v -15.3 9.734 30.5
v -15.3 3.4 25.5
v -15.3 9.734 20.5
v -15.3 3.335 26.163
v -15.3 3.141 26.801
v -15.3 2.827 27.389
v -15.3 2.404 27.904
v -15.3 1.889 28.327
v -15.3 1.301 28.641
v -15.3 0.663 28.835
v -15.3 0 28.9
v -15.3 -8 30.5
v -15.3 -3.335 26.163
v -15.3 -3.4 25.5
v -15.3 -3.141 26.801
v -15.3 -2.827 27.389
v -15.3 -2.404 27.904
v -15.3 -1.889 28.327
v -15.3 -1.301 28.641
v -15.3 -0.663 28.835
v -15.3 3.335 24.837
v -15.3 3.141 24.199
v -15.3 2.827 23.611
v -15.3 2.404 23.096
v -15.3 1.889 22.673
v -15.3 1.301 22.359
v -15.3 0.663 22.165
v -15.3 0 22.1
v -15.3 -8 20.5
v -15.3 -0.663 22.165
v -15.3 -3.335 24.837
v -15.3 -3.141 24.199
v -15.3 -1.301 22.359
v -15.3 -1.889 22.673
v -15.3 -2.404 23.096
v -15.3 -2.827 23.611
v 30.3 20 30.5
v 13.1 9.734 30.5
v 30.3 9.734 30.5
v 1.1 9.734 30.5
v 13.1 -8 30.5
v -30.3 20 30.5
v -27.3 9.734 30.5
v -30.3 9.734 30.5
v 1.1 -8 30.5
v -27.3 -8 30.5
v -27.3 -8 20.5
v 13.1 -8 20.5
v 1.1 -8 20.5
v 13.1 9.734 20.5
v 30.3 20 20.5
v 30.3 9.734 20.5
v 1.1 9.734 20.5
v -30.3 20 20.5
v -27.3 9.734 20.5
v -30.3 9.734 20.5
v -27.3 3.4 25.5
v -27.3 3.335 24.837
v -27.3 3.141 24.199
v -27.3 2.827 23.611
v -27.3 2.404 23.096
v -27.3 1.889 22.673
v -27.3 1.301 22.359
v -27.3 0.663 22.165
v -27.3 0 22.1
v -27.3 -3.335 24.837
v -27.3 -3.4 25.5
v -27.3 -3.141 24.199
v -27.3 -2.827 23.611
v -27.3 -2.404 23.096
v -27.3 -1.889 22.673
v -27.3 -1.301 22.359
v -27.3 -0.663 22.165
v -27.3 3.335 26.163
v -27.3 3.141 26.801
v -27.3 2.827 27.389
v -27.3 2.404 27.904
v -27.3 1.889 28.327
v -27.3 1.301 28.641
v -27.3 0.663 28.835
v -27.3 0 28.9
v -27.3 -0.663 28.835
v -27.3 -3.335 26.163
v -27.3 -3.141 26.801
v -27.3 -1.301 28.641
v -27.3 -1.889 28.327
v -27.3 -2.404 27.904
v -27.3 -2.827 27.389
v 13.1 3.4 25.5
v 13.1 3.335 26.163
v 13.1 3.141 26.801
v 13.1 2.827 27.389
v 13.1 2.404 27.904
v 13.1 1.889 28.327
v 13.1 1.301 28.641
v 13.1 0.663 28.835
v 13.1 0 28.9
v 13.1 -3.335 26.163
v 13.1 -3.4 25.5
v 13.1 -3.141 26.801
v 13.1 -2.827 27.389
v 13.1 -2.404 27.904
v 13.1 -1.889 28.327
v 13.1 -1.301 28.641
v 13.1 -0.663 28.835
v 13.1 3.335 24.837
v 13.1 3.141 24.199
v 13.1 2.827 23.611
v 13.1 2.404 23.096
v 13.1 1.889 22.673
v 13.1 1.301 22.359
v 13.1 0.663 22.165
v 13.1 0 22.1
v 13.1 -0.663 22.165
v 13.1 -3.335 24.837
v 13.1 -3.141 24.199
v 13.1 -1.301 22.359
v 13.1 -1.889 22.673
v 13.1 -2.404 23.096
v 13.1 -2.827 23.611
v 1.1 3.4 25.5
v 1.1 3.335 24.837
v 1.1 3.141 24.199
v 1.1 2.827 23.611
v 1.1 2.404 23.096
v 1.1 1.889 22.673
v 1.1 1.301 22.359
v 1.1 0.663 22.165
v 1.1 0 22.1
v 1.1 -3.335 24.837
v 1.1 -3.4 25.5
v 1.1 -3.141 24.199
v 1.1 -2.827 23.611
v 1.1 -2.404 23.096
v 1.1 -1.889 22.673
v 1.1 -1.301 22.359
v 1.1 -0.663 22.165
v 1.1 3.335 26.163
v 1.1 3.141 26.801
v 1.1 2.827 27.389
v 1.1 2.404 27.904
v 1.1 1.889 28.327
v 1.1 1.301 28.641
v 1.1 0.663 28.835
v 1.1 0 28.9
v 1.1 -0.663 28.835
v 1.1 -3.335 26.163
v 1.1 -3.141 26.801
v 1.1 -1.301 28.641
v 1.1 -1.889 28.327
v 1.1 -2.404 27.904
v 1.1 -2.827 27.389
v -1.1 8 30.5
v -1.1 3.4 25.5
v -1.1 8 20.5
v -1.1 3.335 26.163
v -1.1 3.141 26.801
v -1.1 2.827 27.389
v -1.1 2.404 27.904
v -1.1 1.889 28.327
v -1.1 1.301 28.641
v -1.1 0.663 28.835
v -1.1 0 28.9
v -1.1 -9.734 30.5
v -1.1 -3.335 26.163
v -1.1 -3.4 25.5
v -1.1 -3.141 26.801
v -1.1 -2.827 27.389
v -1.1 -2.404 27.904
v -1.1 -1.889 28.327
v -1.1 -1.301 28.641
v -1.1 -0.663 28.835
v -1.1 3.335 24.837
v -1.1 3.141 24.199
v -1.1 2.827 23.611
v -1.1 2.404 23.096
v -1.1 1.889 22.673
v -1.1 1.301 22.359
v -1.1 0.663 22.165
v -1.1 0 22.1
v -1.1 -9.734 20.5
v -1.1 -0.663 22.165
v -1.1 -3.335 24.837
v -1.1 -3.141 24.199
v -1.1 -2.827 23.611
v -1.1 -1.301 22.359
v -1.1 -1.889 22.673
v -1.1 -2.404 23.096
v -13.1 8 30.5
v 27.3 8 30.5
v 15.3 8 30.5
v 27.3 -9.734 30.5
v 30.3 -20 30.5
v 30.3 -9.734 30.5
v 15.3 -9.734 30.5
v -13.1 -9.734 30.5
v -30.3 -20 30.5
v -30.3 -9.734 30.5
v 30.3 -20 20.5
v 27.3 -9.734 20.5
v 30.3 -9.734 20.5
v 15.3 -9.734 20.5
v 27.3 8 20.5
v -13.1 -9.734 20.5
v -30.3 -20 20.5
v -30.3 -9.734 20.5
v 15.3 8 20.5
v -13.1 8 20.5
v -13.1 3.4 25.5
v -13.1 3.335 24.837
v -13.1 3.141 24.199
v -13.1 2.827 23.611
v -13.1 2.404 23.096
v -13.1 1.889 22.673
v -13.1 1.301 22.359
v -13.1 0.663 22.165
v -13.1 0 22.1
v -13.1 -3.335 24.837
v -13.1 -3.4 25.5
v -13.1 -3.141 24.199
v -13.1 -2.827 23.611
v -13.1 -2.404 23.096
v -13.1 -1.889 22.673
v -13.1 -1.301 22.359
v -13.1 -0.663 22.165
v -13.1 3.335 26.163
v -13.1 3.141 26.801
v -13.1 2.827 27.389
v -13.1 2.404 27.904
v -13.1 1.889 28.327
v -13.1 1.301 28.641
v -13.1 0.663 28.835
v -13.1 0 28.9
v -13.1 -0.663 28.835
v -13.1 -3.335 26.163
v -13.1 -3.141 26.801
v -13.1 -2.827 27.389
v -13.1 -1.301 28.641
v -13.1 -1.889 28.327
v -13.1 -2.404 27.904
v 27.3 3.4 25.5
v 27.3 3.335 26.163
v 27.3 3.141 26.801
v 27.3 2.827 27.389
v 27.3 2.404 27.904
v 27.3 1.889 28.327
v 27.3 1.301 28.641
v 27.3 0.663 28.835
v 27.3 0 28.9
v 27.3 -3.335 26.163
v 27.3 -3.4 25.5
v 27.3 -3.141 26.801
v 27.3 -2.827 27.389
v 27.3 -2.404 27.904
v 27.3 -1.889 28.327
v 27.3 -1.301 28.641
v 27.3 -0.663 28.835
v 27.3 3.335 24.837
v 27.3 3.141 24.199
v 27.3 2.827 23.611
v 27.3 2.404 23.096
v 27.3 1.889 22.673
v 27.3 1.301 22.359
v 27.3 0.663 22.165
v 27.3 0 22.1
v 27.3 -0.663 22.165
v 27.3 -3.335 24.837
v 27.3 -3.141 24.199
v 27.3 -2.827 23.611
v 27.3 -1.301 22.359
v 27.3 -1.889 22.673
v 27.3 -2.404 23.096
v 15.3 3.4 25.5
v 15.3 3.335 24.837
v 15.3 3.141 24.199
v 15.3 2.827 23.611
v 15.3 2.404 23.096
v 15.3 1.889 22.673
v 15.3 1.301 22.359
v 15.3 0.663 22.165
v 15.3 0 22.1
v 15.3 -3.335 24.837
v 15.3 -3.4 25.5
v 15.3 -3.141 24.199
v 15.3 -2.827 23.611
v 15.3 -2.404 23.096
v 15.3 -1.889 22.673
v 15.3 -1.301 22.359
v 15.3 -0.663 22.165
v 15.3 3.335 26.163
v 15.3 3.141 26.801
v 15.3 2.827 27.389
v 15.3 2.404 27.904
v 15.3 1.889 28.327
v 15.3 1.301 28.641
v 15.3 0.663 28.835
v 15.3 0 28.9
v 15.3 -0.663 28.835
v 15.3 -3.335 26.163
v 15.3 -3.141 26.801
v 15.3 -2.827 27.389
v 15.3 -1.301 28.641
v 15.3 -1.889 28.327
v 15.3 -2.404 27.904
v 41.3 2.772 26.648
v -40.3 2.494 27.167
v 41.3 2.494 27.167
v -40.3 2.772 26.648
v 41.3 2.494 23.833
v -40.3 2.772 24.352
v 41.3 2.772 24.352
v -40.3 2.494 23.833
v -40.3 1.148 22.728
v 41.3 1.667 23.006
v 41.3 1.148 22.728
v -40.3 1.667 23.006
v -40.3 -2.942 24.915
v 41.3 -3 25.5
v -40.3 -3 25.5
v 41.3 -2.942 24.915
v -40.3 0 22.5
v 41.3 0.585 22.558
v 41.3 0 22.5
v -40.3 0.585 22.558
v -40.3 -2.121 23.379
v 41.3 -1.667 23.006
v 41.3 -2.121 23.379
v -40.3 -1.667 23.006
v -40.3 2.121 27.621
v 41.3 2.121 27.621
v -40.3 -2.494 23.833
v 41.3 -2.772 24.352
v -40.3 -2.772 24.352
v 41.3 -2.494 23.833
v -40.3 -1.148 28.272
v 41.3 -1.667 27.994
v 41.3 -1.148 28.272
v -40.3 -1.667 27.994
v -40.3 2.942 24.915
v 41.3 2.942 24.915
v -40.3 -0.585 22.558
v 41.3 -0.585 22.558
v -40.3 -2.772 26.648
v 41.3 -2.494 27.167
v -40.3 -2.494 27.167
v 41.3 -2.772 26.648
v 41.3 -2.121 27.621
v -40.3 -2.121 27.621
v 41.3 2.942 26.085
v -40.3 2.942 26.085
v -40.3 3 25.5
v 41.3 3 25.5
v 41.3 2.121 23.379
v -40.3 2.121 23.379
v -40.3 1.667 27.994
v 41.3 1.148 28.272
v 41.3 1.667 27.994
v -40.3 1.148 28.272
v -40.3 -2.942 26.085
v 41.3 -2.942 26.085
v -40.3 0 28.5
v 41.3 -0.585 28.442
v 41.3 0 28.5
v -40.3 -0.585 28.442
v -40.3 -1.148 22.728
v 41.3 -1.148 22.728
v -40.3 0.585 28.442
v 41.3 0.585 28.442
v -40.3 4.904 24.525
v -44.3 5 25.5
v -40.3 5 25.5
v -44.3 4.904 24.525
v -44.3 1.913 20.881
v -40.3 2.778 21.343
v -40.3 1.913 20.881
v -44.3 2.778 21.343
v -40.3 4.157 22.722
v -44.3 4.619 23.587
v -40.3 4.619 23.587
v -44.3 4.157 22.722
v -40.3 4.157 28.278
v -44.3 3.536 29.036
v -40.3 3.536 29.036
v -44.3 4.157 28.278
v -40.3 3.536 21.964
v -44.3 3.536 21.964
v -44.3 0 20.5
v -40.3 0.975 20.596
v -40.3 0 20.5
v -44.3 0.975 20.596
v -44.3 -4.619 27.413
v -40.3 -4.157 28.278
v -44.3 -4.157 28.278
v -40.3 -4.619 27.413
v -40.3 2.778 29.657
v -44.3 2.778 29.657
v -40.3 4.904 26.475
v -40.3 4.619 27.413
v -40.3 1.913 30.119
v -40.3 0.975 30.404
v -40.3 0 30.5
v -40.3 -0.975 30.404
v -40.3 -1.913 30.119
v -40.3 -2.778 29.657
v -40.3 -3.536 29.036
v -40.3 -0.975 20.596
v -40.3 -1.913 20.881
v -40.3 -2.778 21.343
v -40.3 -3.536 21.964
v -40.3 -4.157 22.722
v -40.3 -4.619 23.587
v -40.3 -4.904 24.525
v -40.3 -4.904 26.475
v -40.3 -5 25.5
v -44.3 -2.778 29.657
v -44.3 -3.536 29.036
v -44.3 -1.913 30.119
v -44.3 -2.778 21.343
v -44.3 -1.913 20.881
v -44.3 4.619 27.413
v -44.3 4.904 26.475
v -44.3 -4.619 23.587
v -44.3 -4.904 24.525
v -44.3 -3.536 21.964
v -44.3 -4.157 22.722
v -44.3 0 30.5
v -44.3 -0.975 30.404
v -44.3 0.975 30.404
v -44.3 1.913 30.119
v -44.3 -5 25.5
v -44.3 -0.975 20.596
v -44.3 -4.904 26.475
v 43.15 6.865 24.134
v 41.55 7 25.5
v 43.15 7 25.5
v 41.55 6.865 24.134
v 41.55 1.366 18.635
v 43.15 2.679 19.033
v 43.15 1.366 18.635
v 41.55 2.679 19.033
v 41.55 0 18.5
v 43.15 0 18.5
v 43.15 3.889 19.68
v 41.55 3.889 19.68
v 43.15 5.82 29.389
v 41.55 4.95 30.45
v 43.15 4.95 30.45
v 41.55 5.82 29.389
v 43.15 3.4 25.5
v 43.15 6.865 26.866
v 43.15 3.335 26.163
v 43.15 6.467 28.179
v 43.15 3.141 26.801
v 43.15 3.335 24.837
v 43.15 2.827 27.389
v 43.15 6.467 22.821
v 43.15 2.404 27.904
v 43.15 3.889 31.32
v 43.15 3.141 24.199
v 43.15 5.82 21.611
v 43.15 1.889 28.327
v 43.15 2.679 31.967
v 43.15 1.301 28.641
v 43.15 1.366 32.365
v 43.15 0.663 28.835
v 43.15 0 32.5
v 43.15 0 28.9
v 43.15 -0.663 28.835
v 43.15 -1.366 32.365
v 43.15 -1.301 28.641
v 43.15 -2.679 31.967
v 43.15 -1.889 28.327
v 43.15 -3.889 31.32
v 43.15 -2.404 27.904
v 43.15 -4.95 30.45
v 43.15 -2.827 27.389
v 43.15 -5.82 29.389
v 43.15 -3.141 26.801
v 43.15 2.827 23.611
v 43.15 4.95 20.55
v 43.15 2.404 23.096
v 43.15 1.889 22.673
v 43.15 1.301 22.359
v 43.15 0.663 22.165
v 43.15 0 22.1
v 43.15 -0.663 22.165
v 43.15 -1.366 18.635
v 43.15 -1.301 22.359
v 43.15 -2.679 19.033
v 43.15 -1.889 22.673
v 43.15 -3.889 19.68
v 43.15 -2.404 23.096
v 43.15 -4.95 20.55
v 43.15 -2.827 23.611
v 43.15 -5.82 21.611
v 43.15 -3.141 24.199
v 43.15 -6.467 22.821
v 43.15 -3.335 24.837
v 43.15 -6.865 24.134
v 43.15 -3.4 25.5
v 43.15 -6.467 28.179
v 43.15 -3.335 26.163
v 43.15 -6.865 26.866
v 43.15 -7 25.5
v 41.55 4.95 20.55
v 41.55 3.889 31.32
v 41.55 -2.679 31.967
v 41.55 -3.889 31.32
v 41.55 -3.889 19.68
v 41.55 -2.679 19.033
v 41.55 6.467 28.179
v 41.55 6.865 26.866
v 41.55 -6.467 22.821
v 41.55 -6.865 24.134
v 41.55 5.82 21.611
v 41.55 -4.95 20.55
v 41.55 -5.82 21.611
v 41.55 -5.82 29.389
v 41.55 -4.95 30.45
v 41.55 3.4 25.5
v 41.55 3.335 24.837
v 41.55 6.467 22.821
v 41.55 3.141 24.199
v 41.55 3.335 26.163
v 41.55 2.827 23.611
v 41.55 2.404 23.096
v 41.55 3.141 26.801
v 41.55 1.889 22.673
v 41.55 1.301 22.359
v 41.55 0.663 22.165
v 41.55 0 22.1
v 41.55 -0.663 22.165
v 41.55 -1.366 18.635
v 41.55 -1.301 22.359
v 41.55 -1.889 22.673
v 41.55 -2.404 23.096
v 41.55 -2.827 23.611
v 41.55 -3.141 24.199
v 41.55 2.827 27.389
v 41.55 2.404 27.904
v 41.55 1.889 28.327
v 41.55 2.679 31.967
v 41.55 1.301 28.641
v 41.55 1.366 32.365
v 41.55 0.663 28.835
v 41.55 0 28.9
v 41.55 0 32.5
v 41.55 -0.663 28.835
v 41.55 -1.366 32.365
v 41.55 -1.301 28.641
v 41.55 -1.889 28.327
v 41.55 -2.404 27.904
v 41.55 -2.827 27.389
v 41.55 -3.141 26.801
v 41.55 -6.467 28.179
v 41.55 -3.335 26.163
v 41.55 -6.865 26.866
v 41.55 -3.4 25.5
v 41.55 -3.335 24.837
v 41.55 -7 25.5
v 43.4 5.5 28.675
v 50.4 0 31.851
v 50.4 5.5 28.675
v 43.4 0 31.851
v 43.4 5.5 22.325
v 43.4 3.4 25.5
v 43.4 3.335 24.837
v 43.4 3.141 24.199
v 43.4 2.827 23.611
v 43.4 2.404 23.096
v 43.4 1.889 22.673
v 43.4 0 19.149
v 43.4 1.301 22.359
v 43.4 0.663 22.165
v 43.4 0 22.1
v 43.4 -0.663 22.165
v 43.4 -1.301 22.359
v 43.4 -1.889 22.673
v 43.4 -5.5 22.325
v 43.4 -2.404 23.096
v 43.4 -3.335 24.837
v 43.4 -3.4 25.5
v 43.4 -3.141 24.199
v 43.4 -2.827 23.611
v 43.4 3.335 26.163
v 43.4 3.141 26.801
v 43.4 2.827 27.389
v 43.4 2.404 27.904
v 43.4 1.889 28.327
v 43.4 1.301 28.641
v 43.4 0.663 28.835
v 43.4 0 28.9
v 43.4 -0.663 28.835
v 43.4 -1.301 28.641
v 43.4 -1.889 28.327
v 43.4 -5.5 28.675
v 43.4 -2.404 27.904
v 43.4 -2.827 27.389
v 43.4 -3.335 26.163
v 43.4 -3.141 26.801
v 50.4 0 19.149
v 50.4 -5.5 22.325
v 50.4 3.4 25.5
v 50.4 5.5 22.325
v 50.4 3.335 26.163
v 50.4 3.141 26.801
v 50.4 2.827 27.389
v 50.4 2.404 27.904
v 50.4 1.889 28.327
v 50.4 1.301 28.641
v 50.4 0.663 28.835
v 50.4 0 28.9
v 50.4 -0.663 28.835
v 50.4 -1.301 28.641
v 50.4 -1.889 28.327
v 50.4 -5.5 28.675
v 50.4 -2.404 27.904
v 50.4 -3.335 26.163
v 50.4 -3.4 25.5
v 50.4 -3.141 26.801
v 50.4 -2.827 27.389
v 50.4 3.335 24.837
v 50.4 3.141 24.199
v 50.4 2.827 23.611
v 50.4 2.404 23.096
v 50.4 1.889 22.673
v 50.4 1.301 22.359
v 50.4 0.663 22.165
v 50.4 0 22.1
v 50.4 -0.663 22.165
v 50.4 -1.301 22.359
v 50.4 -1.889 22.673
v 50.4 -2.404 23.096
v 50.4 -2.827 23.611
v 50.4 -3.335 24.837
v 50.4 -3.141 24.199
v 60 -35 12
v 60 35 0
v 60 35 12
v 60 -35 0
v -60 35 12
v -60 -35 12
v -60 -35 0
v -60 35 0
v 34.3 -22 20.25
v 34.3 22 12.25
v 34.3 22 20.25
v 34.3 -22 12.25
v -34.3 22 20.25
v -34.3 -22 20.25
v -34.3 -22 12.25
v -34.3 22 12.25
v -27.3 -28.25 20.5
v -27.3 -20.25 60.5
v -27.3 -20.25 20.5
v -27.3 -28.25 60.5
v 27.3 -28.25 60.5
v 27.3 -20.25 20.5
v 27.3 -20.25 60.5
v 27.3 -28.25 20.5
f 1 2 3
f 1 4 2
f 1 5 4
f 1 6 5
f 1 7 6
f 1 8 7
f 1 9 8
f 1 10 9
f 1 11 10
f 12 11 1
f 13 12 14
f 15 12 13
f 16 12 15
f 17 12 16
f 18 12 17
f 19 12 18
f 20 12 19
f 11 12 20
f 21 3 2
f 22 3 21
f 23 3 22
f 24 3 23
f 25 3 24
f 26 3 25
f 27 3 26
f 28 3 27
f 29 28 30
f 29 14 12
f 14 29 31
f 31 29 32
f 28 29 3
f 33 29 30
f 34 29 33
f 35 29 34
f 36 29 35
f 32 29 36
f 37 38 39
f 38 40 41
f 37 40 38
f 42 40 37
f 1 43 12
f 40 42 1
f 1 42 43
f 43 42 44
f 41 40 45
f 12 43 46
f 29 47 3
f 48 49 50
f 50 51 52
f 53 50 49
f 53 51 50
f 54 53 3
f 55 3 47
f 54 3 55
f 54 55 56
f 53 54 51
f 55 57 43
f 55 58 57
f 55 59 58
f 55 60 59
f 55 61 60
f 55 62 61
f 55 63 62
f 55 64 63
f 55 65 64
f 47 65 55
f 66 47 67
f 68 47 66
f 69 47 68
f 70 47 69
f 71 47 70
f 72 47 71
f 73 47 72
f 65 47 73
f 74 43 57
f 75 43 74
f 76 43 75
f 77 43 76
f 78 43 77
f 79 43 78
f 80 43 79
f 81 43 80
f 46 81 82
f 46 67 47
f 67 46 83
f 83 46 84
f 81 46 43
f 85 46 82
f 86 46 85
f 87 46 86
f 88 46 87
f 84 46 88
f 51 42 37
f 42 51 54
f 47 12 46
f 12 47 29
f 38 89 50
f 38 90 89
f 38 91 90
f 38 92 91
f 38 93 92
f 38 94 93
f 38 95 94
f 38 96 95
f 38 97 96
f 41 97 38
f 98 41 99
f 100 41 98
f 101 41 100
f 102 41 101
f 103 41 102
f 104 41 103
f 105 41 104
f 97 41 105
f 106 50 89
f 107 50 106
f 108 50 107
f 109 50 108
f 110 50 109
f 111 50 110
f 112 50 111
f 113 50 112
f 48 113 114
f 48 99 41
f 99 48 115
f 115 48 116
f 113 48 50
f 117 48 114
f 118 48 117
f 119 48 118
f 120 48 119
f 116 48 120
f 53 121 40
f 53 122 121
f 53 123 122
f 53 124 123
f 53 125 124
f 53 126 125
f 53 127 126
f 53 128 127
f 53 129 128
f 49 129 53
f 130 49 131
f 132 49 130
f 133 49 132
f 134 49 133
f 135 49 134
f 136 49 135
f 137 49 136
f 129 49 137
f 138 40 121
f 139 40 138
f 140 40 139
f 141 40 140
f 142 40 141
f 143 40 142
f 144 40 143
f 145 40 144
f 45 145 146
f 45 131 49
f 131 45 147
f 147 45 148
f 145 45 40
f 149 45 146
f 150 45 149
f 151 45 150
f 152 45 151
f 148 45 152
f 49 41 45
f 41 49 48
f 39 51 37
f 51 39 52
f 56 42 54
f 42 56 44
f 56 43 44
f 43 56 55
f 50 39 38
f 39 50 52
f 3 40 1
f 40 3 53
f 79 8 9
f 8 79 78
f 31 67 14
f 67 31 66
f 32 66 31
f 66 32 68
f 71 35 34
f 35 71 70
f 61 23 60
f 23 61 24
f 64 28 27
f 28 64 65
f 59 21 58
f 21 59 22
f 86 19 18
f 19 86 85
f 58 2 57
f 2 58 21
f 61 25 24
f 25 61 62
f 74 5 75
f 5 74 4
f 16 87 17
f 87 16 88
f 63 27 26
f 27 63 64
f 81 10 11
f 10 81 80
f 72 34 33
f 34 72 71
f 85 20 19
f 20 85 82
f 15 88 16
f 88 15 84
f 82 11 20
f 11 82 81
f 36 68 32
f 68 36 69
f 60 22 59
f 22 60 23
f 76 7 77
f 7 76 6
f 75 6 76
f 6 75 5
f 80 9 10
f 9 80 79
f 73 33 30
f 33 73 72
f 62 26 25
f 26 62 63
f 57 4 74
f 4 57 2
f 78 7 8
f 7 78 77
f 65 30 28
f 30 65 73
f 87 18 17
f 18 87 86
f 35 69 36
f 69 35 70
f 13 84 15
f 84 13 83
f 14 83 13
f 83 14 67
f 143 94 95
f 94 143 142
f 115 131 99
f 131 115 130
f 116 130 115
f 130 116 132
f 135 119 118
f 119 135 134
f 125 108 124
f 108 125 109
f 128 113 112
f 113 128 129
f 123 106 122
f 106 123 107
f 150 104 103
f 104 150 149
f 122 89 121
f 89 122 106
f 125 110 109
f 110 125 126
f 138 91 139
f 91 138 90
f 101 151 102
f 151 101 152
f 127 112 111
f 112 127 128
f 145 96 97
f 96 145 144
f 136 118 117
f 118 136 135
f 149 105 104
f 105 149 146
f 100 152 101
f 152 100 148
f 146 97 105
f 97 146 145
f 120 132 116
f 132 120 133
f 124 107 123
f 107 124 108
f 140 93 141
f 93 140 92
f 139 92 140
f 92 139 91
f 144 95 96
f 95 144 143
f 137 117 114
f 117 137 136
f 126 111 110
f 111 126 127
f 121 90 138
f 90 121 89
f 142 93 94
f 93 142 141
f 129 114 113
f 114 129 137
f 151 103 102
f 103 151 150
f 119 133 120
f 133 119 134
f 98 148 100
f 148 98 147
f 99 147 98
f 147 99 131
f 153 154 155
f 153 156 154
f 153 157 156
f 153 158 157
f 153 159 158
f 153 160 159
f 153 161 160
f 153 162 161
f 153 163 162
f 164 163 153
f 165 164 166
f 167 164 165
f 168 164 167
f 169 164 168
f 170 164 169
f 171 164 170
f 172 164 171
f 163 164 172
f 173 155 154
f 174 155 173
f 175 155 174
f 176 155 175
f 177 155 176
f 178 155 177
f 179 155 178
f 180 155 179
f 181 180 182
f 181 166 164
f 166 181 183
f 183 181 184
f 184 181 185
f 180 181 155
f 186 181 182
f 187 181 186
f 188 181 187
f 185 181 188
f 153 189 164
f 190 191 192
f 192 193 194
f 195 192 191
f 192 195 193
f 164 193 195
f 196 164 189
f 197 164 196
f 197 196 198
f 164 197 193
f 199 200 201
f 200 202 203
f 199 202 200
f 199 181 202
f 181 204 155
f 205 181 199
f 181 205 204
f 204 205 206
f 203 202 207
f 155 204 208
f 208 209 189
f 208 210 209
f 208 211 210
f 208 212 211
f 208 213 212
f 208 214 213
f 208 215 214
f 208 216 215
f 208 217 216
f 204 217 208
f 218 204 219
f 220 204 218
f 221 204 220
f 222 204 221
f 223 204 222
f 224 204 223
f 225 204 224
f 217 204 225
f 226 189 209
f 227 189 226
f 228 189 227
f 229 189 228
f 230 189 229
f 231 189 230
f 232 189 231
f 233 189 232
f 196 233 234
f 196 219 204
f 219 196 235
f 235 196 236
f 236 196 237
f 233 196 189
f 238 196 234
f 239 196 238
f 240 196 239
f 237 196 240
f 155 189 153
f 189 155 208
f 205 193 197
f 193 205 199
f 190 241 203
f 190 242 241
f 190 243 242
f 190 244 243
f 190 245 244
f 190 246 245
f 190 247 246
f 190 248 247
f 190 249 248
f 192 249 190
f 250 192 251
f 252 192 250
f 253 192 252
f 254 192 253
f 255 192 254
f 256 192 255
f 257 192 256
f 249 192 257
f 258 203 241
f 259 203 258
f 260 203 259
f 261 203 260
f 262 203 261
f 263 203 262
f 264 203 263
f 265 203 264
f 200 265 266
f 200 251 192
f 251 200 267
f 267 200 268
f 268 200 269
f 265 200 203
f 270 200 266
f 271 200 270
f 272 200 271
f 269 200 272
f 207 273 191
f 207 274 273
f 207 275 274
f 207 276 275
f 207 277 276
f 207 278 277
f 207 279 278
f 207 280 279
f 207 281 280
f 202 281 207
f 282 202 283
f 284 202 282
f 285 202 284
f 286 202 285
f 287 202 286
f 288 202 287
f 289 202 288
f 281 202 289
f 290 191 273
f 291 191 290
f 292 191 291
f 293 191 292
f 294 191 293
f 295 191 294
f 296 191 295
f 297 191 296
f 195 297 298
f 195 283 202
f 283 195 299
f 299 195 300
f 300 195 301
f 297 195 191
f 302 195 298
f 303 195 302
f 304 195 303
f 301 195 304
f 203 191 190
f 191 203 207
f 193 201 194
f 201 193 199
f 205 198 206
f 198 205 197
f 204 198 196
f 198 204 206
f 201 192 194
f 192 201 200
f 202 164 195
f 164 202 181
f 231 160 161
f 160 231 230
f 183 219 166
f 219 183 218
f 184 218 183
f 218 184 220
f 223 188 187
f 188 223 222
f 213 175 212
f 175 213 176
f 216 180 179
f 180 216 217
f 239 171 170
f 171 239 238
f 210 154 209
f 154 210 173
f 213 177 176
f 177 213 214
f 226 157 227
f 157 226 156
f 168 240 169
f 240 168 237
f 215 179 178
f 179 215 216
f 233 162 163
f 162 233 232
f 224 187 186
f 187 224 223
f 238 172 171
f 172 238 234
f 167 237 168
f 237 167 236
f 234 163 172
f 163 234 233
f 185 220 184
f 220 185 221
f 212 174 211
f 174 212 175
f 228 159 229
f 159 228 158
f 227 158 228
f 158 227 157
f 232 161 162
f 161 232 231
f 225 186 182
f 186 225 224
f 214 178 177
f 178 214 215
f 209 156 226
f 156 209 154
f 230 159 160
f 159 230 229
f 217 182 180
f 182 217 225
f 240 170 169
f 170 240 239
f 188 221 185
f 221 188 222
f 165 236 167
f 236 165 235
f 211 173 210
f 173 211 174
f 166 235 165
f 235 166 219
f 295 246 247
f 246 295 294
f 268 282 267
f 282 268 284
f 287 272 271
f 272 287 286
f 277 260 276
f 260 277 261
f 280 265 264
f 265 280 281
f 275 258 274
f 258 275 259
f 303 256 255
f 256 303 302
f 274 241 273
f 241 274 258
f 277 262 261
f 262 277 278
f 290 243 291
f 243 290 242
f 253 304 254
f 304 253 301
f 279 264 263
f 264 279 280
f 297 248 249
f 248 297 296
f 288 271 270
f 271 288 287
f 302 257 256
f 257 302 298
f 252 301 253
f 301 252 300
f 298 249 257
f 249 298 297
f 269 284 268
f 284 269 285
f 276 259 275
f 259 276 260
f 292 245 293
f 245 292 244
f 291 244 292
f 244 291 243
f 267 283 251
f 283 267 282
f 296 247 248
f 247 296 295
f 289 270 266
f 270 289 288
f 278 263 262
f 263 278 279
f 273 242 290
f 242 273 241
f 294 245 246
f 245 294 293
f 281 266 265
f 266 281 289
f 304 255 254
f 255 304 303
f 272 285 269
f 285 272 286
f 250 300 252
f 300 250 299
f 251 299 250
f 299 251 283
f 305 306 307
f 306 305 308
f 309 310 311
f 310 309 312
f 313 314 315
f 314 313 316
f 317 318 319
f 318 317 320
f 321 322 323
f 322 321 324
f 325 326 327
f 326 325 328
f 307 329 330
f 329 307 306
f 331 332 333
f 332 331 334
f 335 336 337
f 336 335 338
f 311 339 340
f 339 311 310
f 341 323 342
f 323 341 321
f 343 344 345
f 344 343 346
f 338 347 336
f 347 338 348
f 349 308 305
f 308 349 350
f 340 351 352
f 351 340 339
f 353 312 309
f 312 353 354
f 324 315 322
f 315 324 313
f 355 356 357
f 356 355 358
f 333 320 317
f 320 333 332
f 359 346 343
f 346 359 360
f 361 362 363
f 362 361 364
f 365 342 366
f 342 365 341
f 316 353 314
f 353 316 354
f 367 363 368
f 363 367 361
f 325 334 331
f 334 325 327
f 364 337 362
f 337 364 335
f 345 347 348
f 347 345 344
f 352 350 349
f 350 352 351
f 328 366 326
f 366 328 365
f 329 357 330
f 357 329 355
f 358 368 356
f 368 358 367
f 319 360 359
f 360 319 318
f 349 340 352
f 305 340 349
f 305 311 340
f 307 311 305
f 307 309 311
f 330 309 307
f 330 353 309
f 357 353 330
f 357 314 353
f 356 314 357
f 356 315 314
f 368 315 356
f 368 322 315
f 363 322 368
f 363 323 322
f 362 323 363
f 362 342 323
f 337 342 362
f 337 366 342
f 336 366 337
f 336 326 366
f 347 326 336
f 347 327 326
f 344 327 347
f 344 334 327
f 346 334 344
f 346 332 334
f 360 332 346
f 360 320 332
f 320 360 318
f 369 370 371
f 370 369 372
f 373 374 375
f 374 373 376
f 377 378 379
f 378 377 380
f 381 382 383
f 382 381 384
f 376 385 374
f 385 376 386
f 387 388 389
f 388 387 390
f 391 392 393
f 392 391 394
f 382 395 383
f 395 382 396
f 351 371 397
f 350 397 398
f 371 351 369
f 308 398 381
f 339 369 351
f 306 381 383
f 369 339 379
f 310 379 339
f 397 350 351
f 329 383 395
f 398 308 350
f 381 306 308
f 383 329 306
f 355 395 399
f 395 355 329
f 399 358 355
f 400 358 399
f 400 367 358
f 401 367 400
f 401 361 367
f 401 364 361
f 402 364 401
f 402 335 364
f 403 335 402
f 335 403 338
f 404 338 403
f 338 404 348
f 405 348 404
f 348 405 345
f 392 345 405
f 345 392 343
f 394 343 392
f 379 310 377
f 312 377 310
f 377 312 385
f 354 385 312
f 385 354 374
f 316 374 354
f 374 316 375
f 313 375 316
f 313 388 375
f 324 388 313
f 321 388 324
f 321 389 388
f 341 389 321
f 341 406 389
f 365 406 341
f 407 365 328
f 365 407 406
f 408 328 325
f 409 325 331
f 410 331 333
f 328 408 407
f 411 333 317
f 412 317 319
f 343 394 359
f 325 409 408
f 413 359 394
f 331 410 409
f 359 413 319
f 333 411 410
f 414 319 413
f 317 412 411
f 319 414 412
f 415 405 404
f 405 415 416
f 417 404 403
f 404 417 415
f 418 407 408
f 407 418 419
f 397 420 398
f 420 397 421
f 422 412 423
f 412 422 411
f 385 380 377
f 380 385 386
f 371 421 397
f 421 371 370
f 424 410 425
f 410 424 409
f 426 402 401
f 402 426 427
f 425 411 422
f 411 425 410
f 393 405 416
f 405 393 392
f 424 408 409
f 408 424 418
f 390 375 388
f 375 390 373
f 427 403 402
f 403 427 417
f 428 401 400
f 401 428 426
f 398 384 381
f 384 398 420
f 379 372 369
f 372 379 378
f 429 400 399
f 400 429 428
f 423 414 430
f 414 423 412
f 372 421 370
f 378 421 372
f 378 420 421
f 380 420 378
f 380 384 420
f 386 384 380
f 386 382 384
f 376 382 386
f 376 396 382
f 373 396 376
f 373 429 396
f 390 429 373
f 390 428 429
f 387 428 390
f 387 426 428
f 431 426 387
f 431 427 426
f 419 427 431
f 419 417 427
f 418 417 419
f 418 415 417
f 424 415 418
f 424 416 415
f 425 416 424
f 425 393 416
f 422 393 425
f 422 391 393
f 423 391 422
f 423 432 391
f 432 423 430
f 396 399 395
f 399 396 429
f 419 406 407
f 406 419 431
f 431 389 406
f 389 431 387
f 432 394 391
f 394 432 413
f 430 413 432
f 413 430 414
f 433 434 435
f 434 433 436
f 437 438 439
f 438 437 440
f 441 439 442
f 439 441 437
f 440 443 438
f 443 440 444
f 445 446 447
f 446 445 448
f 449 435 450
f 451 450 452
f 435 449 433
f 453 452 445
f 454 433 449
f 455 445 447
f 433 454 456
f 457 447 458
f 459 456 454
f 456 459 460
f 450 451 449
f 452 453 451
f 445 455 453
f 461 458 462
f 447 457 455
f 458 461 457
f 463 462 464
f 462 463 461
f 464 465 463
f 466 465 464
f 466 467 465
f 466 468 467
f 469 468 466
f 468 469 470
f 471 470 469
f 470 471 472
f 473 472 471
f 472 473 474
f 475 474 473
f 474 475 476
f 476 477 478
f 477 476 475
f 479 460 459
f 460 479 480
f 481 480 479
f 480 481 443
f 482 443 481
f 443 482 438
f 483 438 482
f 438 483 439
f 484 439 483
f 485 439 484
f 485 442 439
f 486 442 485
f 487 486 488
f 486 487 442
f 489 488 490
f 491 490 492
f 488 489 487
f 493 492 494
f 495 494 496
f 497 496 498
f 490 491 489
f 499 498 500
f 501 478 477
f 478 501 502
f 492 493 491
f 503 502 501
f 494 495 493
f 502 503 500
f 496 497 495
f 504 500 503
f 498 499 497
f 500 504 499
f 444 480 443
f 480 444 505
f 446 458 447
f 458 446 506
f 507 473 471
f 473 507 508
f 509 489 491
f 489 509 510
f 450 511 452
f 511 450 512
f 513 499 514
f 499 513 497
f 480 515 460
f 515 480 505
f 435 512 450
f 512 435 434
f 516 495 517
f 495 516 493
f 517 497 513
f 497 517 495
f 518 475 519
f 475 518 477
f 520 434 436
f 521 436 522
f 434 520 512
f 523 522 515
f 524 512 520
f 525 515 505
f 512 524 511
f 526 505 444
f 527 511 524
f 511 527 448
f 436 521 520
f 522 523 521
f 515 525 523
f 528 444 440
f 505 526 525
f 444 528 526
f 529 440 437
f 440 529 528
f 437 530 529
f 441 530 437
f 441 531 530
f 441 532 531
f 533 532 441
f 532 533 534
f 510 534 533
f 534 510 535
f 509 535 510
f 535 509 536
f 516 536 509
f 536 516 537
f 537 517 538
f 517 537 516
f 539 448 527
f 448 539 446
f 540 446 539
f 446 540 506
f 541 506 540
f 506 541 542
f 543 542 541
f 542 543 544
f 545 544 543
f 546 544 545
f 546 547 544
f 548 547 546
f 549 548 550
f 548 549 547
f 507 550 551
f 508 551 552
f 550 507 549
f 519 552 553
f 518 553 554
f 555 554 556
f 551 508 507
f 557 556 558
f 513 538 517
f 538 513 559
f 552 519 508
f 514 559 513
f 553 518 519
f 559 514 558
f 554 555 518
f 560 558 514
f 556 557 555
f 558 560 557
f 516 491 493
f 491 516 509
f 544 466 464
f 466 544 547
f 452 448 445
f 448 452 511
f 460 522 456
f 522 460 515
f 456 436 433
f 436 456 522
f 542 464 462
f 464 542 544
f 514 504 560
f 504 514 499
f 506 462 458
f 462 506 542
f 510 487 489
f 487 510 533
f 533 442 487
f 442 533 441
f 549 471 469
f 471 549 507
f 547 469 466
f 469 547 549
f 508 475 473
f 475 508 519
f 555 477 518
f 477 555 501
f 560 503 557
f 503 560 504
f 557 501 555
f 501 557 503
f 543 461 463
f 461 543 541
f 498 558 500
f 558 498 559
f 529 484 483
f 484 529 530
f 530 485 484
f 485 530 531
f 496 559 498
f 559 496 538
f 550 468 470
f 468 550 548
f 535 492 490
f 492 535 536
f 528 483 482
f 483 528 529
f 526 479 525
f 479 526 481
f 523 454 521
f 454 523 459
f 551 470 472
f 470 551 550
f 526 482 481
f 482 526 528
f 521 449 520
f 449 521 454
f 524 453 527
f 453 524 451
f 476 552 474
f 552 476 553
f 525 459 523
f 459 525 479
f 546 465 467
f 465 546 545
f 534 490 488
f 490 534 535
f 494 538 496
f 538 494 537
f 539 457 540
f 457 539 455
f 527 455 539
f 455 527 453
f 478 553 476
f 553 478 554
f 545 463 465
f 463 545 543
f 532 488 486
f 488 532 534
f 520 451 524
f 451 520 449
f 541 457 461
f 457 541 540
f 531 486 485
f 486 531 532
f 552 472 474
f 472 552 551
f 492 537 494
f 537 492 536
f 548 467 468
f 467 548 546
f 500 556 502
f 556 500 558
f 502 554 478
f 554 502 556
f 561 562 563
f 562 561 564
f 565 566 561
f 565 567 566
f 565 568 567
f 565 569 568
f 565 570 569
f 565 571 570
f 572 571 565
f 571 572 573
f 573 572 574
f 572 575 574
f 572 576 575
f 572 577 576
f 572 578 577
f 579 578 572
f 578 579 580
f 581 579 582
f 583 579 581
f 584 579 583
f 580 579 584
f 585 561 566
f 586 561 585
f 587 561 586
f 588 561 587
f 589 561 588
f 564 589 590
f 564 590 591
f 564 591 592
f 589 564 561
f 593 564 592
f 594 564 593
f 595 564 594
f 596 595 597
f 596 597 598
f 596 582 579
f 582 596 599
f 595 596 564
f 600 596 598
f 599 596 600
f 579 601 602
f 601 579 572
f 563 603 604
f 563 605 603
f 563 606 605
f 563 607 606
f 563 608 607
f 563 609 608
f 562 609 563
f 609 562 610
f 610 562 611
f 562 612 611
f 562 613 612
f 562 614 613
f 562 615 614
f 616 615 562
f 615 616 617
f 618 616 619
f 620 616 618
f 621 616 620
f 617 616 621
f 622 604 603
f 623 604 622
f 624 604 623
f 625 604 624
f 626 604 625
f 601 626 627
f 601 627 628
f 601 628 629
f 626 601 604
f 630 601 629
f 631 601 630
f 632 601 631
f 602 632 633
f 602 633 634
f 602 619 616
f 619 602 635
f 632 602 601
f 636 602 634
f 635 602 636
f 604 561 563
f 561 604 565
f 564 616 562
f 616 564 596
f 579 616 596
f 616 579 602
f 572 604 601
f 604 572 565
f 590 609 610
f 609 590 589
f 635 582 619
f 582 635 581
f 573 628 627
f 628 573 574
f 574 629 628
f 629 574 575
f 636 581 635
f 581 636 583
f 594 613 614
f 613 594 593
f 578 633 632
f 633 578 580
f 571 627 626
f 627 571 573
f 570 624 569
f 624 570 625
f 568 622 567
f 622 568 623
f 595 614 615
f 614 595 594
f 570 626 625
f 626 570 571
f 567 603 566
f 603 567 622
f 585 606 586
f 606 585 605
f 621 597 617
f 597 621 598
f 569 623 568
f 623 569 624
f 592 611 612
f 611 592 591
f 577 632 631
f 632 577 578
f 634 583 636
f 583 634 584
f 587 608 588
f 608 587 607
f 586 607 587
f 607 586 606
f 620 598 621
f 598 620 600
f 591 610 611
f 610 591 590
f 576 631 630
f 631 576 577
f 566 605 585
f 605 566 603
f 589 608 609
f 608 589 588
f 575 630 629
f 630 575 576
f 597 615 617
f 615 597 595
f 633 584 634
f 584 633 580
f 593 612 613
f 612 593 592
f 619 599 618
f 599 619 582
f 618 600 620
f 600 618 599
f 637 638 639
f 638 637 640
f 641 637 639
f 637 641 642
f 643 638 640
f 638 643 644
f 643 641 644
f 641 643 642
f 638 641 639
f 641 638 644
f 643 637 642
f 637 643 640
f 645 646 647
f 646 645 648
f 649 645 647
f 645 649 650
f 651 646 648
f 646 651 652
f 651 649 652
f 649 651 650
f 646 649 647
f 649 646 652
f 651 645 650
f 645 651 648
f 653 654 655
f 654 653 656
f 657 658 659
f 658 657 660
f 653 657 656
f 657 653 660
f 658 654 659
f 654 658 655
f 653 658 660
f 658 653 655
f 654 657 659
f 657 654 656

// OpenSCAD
$fn = 32;

// ------------------------------------------------------------------------
// Comb hinge with flap: leaf 60.6 x 20 mm, pin d6, flap 40 mm
// Every part is its own module, assembly() places every instance.
// ------------------------------------------------------------------------

// --- part 1 ---
module hinge_bed() {
  difference() {
    translate([-60, -35, 0]) cube([120, 70, 12]);
  }
}

// --- part 2 ---
module hinge_riser() {
  difference() {
    translate([-34.3, -22, 0]) cube([68.6, 44, 8]);
  }
}

// --- part 3 ---
module hinge_leaf_a() {
  difference() {
    union() {
      translate([-27.3, -8, -5]) cube([12, 28, 10]);
      translate([1.1, -8, -5]) cube([12, 28, 10]);
      translate([-30.3, 9.734, -5]) cube([60.6, 10.266, 10]);
    }
    translate([-21.3, 0, 0]) rotate([0, 90, 0]) cylinder(h = 14, d = 6.8, center = true);
    translate([7.1, 0, 0]) rotate([0, 90, 0]) cylinder(h = 14, d = 6.8, center = true);
  }
}

// --- part 4 ---
module hinge_leaf_b() {
  difference() {
    union() {
      translate([-13.1, -20, -5]) cube([12, 28, 10]);
      translate([15.3, -20, -5]) cube([12, 28, 10]);
      translate([-30.3, -20, -5]) cube([60.6, 10.266, 10]);
    }
    translate([-7.1, 0, 0]) rotate([0, 90, 0]) cylinder(h = 14, d = 6.8, center = true);
    translate([21.3, 0, 0]) rotate([0, 90, 0]) cylinder(h = 14, d = 6.8, center = true);
  }
}

// --- part 5 ---
module hinge_flap() {
  difference() {
    translate([-27.3, -20, 0]) cube([54.6, 40, 8]);
  }
}

// --- part 6 ---
module hinge_pin() {
  rotate([0, 90, 0]) cylinder(h = 82.6, d = 6, center = true);
  translate([-44.3, 0, 0]) rotate([0, 90, 0]) cylinder(h = 4, d = 10);
}

// --- part 7 ---
module pin_washer() {
  difference() {
      translate([0, 0, 0]) cylinder(h = 1.6, d = 14);
      translate([0, 0, -1]) cylinder(h = 3.6, d = 6.8);
    }
}

// --- part 8 ---
module pin_nut() {
  difference() {
    linear_extrude(height = 7) polygon(points = [[6.351, 0], [3.175, 5.5], [-3.175, 5.5], [-6.351, 0], [-3.175, -5.5], [3.175, -5.5]]);
    translate([0, 0, -1]) cylinder(h = 9, d = 6.8);
  }
}

// --- assembly ---
module assembly() {
  color([0.80, 0.24, 0.20]) translate([0, 0, 0]) rotate([0, 0, 0]) hinge_bed();
  color([0.20, 0.45, 0.75]) translate([0, 0, 12.25]) rotate([0, 0, 0]) hinge_riser();
  color([0.25, 0.62, 0.32]) translate([0, 0, 25.5]) rotate([0, 0, 0]) hinge_leaf_a();
  color([0.92, 0.70, 0.18]) translate([0, 0, 25.5]) rotate([0, 0, 0]) hinge_leaf_b();
  color([0.58, 0.35, 0.70]) translate([0, -20.25, 40.5]) rotate([90, 0, 0]) hinge_flap();
  color([0.16, 0.66, 0.66]) translate([0, 0, 25.5]) rotate([0, 0, 0]) hinge_pin();
  color([0.85, 0.48, 0.18]) translate([41.55, 0, 25.5]) rotate([0, 90, 0]) pin_washer();
  color([0.55, 0.60, 0.65]) translate([43.4, 0, 25.5]) rotate([0, 90, 0]) pin_nut();
}

assembly();
